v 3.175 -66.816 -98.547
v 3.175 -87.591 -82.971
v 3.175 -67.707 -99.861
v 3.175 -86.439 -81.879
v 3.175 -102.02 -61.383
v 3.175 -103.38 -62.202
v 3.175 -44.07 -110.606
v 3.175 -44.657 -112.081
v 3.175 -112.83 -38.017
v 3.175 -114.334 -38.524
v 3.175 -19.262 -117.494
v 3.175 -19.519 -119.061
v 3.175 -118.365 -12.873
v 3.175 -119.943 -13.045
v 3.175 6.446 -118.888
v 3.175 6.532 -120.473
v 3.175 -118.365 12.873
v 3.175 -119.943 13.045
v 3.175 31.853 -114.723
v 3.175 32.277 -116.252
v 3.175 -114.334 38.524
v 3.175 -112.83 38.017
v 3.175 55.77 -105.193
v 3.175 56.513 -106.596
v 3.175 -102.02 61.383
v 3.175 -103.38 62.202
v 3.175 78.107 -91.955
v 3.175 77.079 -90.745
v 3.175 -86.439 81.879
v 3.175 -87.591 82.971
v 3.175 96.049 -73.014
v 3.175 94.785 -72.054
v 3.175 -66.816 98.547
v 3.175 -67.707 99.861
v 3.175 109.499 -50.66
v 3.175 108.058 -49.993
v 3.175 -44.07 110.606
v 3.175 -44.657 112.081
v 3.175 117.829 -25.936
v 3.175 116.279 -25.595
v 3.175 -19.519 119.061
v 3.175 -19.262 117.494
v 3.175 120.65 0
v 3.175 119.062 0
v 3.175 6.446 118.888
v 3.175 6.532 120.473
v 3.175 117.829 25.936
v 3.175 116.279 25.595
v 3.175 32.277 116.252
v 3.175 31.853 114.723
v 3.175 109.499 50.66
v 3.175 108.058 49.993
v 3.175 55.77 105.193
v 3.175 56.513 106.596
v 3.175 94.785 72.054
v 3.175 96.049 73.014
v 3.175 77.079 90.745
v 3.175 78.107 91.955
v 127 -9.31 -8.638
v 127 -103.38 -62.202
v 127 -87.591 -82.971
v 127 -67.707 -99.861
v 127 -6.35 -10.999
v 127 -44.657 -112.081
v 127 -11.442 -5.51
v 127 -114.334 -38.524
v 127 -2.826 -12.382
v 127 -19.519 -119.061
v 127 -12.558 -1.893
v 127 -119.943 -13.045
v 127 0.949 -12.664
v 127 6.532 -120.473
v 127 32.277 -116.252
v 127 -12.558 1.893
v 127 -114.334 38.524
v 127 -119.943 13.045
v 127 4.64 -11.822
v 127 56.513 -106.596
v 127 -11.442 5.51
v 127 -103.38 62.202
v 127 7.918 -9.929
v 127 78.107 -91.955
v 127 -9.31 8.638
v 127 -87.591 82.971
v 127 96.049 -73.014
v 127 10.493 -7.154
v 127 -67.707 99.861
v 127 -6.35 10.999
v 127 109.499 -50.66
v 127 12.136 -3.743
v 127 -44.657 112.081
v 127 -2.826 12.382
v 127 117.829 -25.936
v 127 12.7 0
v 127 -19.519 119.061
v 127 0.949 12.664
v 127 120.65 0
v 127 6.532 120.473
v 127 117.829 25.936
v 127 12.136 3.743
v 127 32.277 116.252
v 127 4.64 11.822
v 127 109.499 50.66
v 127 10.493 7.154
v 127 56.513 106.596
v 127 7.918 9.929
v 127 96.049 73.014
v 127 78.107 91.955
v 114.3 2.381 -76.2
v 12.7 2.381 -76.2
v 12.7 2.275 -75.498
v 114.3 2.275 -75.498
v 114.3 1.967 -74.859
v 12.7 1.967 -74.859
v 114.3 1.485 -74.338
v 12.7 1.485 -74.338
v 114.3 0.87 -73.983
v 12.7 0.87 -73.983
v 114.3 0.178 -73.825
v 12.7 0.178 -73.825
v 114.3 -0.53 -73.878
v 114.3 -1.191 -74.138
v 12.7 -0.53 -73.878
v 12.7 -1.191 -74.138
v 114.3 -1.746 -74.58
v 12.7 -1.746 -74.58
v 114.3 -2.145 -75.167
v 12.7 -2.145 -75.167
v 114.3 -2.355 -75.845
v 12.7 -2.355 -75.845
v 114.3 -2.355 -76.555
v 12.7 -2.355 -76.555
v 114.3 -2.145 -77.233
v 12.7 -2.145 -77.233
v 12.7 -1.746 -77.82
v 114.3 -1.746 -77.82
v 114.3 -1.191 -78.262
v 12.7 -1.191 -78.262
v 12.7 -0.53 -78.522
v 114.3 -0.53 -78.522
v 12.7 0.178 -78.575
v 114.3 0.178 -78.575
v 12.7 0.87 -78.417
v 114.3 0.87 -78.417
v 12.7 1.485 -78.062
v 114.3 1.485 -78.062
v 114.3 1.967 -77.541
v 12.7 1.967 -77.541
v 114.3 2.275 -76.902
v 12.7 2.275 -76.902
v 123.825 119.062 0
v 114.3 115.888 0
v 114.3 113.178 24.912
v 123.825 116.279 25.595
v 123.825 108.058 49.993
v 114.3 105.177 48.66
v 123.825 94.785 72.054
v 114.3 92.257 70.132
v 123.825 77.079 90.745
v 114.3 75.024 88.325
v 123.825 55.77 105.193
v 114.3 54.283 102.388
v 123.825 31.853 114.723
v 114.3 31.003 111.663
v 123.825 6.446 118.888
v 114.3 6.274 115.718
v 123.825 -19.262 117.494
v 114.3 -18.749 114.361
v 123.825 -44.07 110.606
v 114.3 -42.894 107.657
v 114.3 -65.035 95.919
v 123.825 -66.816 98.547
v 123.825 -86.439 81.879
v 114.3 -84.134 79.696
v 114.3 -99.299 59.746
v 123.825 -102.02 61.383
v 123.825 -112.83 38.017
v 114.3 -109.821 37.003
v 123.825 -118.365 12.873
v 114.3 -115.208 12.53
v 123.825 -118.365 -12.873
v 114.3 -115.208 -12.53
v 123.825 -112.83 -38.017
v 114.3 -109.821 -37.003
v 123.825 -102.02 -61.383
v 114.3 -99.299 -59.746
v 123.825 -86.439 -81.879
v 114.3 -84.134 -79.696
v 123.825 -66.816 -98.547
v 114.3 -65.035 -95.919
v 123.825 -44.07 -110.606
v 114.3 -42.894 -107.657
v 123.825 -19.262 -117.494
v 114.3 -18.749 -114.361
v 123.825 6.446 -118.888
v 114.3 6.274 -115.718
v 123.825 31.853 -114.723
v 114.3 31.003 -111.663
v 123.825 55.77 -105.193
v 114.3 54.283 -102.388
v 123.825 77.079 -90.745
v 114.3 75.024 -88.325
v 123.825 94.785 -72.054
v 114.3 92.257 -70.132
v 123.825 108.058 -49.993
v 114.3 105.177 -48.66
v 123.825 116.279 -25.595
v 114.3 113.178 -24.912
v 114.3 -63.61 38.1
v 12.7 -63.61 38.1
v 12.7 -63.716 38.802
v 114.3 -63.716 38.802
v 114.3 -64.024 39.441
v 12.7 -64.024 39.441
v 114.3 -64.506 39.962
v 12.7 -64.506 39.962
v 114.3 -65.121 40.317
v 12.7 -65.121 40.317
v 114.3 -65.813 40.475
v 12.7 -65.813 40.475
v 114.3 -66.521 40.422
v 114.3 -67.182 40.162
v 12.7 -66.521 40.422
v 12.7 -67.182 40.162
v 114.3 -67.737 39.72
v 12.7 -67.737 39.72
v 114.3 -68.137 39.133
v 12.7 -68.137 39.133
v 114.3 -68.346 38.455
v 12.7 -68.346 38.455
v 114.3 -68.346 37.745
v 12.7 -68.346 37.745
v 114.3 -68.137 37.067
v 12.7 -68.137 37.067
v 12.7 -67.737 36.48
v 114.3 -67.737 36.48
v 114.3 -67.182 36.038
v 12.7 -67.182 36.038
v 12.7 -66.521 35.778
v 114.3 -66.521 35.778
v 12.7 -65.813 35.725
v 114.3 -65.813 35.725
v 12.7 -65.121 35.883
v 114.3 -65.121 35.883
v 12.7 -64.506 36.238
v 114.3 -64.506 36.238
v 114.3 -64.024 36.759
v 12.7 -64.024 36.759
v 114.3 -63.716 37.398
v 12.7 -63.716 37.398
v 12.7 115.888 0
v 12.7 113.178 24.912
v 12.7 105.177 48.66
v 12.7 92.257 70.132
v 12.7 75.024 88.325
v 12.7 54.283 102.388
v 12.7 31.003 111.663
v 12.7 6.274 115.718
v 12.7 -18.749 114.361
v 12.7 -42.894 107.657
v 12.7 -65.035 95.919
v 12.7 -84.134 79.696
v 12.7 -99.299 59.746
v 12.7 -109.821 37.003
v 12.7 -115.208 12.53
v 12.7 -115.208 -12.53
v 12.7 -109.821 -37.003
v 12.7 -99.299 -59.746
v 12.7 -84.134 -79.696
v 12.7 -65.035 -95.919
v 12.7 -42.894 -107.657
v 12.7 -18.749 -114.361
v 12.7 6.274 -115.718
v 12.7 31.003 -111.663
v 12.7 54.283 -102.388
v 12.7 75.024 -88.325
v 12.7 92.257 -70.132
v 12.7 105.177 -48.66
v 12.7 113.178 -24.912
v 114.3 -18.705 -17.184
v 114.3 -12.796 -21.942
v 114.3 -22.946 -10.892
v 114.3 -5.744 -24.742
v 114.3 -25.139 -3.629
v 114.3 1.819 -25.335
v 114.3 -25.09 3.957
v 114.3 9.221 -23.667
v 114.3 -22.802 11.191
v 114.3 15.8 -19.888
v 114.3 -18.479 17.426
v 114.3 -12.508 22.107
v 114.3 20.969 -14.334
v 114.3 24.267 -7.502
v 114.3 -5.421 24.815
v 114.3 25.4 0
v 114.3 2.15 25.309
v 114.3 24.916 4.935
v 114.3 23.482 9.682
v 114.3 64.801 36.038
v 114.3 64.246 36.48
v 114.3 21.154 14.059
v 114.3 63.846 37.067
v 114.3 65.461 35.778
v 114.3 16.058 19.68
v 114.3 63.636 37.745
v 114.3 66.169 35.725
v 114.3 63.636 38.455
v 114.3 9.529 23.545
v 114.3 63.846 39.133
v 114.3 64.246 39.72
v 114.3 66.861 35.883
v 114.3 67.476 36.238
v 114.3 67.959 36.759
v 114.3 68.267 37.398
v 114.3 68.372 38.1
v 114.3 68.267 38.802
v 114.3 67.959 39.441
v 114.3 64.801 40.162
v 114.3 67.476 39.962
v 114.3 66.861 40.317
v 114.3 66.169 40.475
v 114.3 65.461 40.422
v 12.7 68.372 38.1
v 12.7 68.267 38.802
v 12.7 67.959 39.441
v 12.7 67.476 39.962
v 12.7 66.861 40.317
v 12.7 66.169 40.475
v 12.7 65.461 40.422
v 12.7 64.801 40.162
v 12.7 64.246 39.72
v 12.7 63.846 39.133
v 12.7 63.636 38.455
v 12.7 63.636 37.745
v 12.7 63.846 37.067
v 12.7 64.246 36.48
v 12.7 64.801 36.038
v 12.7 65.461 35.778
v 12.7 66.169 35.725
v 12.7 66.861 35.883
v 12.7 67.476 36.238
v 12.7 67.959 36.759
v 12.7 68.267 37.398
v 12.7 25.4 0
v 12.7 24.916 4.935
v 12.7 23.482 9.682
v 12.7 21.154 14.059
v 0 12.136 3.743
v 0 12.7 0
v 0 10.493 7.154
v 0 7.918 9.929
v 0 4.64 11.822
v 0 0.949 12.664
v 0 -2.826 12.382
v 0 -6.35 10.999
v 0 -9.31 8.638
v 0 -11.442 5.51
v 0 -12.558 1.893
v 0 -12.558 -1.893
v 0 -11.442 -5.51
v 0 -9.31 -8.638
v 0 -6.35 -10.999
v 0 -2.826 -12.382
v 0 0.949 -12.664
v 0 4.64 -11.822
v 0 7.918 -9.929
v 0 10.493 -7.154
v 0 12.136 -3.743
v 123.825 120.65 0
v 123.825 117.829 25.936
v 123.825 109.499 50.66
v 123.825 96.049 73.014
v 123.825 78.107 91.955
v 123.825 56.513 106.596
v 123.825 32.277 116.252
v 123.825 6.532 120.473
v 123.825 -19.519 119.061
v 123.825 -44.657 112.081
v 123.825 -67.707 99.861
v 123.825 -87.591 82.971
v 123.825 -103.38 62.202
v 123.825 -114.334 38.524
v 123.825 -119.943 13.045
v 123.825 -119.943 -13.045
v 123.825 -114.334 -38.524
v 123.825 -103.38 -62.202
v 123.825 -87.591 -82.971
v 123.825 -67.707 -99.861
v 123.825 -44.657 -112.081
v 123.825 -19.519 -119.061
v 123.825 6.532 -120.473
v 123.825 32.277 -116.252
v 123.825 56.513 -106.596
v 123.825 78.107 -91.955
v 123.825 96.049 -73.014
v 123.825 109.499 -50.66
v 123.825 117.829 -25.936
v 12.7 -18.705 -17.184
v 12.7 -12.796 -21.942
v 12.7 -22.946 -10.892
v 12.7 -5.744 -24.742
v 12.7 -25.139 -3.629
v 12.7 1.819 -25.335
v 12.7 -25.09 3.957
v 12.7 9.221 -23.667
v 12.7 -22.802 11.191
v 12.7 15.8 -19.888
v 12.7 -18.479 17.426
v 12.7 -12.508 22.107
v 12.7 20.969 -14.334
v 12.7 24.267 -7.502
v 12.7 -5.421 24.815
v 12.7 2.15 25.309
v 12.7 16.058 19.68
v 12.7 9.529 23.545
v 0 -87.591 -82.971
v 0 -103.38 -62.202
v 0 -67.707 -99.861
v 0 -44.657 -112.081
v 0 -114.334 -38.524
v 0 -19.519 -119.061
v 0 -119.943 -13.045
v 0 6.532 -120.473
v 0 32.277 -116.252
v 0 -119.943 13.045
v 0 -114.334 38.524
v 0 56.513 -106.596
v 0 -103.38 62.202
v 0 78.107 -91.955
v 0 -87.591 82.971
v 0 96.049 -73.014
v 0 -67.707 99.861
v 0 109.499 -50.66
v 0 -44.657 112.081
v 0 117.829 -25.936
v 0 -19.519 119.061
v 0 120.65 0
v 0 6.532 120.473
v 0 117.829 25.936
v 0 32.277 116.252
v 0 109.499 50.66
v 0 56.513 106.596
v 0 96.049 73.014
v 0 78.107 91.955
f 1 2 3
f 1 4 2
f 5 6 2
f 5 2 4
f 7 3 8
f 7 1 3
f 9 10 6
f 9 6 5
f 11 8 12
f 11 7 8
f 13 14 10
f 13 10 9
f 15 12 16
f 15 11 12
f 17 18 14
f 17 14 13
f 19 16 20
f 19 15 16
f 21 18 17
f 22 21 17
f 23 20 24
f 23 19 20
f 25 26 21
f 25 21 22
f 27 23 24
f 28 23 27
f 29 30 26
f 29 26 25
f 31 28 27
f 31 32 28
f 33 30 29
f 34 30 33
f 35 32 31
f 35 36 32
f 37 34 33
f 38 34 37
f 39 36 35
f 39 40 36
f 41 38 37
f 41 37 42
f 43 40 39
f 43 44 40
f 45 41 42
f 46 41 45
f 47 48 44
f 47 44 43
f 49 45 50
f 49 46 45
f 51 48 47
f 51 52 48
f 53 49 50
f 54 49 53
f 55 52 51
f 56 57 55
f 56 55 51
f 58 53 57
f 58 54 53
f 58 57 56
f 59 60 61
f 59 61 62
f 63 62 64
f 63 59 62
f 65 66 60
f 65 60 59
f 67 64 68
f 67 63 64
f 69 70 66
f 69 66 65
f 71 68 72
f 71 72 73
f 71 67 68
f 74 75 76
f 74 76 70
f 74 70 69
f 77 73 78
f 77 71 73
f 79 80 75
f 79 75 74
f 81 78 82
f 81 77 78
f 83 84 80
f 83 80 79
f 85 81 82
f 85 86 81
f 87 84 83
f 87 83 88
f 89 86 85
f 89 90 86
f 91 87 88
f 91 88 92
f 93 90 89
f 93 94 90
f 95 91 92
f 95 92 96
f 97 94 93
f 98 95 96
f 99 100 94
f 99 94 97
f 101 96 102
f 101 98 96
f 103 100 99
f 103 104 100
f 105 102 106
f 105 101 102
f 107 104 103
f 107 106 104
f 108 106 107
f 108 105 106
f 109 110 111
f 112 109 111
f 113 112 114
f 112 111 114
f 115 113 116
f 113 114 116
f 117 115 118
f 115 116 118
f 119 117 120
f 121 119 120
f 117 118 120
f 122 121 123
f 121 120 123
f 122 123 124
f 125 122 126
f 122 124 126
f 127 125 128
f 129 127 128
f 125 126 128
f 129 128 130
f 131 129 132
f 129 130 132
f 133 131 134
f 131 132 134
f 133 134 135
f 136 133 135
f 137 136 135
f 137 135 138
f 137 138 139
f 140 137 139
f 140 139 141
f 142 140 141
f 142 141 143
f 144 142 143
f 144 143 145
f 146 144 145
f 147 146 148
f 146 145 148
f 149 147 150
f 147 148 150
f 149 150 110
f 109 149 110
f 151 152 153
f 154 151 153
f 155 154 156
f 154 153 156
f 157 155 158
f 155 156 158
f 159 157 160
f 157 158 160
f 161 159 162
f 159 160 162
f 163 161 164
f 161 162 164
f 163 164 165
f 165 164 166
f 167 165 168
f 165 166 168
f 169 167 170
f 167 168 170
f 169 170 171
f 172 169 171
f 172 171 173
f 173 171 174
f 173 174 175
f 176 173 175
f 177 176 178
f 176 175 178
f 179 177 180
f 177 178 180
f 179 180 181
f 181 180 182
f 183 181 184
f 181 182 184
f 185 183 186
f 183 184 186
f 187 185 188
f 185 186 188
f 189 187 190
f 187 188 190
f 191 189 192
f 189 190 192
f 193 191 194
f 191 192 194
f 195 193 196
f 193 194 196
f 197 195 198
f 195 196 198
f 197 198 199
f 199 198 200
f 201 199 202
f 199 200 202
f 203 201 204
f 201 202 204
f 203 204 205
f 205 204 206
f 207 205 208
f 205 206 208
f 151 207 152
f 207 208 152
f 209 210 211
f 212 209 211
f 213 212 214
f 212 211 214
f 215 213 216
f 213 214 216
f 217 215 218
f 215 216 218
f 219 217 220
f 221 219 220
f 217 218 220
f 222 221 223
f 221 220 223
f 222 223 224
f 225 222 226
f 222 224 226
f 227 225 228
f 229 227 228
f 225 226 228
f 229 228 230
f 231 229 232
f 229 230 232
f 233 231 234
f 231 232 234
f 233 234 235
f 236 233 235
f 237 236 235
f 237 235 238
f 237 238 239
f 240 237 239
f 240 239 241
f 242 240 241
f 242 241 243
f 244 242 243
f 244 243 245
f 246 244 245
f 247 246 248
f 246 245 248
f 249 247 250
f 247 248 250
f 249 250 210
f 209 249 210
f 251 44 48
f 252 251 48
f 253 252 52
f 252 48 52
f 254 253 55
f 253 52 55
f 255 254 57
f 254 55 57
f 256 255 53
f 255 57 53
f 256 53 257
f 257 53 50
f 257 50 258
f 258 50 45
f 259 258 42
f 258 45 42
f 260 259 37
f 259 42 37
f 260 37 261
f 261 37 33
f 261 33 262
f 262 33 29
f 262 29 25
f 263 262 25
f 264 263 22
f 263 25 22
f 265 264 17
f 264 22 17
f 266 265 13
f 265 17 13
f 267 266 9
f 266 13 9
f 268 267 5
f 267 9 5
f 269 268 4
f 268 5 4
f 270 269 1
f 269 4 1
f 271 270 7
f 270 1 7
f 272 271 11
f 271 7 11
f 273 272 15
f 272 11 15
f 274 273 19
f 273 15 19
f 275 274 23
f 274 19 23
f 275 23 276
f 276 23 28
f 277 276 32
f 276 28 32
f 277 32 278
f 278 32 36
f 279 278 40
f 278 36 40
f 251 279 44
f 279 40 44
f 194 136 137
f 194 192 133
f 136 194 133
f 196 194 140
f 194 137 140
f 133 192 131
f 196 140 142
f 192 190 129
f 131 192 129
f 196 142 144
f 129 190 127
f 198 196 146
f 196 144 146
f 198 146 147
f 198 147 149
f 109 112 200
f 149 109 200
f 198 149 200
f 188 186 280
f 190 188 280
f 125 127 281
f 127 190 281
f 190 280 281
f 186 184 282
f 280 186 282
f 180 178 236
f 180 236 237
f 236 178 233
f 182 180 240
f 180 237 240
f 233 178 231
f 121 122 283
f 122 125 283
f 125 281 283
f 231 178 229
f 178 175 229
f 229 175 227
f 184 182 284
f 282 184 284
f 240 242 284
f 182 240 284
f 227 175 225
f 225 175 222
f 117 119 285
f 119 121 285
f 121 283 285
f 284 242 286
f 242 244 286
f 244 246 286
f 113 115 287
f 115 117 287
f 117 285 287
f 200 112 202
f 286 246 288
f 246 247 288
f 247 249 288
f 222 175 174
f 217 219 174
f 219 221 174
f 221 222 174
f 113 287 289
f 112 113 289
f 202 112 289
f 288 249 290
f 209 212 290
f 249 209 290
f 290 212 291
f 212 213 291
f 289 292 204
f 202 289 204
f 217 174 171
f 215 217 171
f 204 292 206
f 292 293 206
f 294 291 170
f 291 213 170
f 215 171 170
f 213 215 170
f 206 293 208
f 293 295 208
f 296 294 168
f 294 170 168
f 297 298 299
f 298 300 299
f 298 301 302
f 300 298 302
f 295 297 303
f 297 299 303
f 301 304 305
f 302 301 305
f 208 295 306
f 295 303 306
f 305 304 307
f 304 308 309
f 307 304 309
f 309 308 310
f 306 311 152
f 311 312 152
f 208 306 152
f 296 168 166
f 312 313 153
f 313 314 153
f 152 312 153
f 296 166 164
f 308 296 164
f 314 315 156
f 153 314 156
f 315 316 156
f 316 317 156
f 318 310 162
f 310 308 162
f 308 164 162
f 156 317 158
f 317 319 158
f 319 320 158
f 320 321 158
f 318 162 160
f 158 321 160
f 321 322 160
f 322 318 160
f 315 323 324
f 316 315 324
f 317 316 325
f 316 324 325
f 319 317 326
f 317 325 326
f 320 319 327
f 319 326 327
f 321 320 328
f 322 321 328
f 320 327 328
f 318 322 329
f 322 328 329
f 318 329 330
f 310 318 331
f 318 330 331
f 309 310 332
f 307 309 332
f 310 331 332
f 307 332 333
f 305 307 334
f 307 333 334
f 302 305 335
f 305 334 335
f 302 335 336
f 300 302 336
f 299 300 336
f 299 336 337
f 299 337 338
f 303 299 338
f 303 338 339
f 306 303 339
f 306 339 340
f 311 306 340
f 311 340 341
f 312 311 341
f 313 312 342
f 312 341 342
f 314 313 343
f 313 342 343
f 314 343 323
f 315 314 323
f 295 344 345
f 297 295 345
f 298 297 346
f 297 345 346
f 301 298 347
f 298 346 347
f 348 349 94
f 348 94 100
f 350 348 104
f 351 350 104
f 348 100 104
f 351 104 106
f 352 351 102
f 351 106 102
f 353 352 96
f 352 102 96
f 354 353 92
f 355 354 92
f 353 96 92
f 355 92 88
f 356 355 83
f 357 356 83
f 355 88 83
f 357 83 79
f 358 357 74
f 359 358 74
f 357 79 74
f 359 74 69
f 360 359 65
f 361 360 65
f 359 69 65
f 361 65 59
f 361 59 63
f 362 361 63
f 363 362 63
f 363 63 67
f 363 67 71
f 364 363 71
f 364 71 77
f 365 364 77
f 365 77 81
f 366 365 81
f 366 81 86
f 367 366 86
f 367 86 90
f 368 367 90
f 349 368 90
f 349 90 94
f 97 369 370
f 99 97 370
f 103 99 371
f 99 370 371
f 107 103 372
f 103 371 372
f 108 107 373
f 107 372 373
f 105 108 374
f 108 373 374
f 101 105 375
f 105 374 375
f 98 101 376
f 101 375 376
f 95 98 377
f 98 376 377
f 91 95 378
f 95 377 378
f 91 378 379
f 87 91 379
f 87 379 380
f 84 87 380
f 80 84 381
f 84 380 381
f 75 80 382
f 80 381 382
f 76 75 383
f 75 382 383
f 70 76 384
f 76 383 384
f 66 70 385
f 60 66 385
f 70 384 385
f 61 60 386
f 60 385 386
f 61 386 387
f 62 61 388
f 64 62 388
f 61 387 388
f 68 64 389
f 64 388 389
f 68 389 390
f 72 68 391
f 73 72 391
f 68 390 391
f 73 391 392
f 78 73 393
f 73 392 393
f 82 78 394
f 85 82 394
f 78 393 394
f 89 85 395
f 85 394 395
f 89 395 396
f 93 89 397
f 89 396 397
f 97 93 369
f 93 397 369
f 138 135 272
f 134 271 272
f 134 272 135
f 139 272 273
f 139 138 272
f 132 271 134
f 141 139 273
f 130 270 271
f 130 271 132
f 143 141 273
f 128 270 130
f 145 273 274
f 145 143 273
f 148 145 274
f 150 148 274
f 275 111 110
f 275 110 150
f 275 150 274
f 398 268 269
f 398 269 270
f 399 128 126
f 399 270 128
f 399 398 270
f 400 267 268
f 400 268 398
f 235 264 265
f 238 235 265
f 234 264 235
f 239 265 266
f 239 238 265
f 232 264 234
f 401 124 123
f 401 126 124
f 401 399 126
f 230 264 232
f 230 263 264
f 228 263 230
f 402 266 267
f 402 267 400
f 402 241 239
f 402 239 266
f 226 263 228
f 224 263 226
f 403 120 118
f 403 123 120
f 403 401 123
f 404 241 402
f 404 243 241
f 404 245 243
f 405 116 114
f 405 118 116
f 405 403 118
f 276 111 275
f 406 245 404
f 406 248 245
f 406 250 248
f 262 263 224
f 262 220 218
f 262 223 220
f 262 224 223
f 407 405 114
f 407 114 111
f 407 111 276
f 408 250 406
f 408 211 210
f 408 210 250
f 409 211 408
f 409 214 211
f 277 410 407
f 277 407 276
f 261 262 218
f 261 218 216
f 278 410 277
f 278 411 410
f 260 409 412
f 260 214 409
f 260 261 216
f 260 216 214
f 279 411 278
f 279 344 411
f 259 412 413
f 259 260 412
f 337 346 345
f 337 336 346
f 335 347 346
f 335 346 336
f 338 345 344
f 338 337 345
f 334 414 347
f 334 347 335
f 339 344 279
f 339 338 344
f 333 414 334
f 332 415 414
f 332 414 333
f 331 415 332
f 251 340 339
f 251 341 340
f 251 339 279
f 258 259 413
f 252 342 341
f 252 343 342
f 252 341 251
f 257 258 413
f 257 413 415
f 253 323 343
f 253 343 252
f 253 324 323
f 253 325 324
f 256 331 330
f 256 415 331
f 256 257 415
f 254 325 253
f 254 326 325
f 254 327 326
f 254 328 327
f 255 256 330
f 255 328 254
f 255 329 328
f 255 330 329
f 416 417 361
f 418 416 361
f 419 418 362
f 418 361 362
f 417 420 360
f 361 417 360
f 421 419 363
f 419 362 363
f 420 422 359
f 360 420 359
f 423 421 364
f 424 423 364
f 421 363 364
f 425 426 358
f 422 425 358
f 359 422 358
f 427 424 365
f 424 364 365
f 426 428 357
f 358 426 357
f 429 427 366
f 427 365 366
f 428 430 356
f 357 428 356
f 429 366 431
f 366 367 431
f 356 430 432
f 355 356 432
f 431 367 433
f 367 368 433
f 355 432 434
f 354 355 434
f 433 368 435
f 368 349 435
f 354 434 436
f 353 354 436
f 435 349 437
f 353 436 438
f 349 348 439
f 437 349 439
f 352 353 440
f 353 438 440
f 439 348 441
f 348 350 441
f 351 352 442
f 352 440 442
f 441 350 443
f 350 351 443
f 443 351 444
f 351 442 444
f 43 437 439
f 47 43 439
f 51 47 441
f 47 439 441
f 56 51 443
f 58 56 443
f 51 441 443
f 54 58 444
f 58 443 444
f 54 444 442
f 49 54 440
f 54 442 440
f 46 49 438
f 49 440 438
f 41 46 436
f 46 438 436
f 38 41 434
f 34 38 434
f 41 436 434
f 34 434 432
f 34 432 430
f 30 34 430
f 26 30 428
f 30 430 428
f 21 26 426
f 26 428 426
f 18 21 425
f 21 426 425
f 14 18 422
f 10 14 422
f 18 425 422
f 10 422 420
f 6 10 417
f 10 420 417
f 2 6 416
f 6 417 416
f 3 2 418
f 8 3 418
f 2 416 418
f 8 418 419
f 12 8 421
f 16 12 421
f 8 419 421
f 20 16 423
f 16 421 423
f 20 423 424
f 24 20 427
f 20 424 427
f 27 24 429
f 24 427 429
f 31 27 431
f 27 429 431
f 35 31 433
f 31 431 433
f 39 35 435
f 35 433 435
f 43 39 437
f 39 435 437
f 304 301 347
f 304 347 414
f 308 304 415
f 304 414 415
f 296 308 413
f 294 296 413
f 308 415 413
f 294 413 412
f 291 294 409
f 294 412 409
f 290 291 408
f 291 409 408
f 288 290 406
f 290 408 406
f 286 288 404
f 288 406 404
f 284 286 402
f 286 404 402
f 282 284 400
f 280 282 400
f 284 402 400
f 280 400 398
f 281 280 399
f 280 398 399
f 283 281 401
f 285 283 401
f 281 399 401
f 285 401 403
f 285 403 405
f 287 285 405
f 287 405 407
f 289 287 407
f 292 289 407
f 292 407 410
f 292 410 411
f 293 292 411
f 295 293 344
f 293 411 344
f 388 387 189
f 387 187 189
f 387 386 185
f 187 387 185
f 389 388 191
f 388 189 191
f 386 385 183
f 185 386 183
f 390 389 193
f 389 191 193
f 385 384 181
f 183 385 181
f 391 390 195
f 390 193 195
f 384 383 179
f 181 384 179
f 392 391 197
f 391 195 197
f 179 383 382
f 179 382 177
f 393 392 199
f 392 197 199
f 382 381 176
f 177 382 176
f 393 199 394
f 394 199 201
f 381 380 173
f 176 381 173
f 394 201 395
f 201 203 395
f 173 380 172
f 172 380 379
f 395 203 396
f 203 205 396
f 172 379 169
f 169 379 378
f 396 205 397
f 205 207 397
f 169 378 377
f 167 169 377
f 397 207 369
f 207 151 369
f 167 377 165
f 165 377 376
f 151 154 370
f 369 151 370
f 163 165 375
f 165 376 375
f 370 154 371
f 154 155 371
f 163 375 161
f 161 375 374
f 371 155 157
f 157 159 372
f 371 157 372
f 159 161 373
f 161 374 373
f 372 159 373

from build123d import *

# Parameters (mm, degrees)
F0_R      = 120.65
F1_DEPTH  = 3.175
F2_R      = 119.0625
F3_DEPTH  = 9.525
F4_SIZE2  = 9.52499
F4_SIZE   = 3.17499
F5_R      = 2.38125
F6_DEPTH  = 101.6
F7_R      = 119.0625
F8_DEPTH  = 9.525
F9_R      = 120.65
F10_DEPTH = 3.175
F11_SIZE2 = 3.17499
F11_SIZE  = 9.52499
F12_R     = 12.7
F13_DEPTH = 127.001


# Not quite as in the source:
# - a fillet or chamfer is up to 0.001 mm smaller than in the source, because OpenCascade refuses the exact size


with BuildPart() as f1:
    # F0 (on Right) → F1 (new body)
    with BuildSketch(Plane.YZ):
        Circle(F0_R)
    extrude(amount=F1_DEPTH)

    # F2 (on face) → F3 (join)
    with BuildSketch(Plane.YZ.offset(3.175)):
        Circle(F2_R)
    extrude(amount=F3_DEPTH)

    # F4 (size 3.175 and 9.525 in the source; OpenCascade refuses exactly that, so slightly less here)
    f4_edges = [f1.edges().sort_by_distance(p)[0] for p in [
        (12.7, -119.0625, 0),
    ]]
    f4_side = f1.faces().sort_by_distance((12.7, 0, 0))[0]
    chamfer(f4_edges, length=F4_SIZE, length2=F4_SIZE2, reference=f4_side)

    # F5 (on face) → F6 (join)
    with BuildSketch(Plane.YZ.offset(12.7)):
        with BuildLine():
            ThreePointArc((21.1539941395, 14.0594641416), (-24.3153393061, -7.3433149482), (25.4, 0))
            ThreePointArc((25.4, 0), (24.3153393061, 7.3433149482), (21.1539941395, 14.0594641416))
        make_face()
        with Locations((0, -76.2)):
            Circle(F5_R)
        with Locations((65.9911357684, 38.1)):
            Circle(F5_R)
        with Locations((-65.9911357684, 38.1)):
            Circle(F5_R)
    extrude(amount=F6_DEPTH)

    # F7 (on face) → F8 (join)
    with BuildSketch(Plane.YZ.offset(114.3)):
        Circle(F7_R)
    extrude(amount=F8_DEPTH)

    # F9 (on face) → F10 (join)
    with BuildSketch(Plane.YZ.offset(123.825)):
        Circle(F9_R)
    extrude(amount=F10_DEPTH)

    # F11 (size 9.525 and 3.175 in the source; OpenCascade refuses exactly that, so slightly less here)
    f11_edges = [f1.edges().sort_by_distance(p)[0] for p in [
        (114.3, -119.0625, 0),
    ]]
    f11_side = f1.faces().sort_by_distance((119.0625, -119.0625, 0))[0]
    chamfer(f11_edges, length=F11_SIZE, length2=F11_SIZE2, reference=f11_side)

    # F12 (on face) → F13 (cut, through all)
    with BuildSketch(Plane.YZ.offset(127)):
        Circle(F12_R)
    extrude(amount=-F13_DEPTH, mode=Mode.SUBTRACT)


solid = f1.part
